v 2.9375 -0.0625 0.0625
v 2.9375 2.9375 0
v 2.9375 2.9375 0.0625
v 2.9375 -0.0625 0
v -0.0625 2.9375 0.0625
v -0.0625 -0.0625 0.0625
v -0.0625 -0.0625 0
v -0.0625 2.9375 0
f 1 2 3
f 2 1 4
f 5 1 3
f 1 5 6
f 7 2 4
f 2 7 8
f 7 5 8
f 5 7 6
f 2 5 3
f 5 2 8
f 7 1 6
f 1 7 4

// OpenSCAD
// element10.scad
// Units: inches

plate_w = 2 + 7/8;
plate_d = 2 + 7/8;
plate_h = 1/16;

hole_d = 3/32;
hole_r = hole_d / 2;

module rivet_holes() {
    // 10 holes per side; inset = half the spacing so holes form a clean frame
    spacing_x = plate_w / 10;
    spacing_y = plate_d / 10;
    inset_x   = spacing_x / 2;
    inset_y   = spacing_y / 2;
/*
    // Front edge
    for (i = [0:9])
        translate([inset_x + i * spacing_x, inset_y, -1])
            cylinder(h = plate_h + 2, r = hole_r, $fn = 20);

    // Back edge
    for (i = [0:9])
        translate([inset_x + i * spacing_x, plate_d - inset_y, -1])
            cylinder(h = plate_h + 2, r = hole_r, $fn = 20);
*/
    // Left edge
    for (i = [0:9])
        translate([inset_x, inset_y + i * spacing_y, -1])
            cylinder(h = plate_h + 2, r = hole_r, $fn = 20);

    // Right edge
    for (i = [0:9])
        translate([plate_w - inset_x, inset_y + i * spacing_y, -1])
            cylinder(h = plate_h + 2, r = hole_r, $fn = 20);
}

rivet_h = plate_h;

module rivets() {
    spacing_x = plate_w / 10;
    spacing_y = plate_d / 10;
    inset_x   = spacing_x / 2;
    inset_y   = spacing_y / 2;

    color("lightgray") {
/*
        // Front edge
        for (i = [0:9])
            translate([inset_x + i * spacing_x, inset_y, 0])
                cylinder(h = rivet_h, r = hole_r, $fn = 20);

        // Back edge
        for (i = [0:9])
            translate([inset_x + i * spacing_x, plate_d - inset_y, 0])
                cylinder(h = rivet_h, r = hole_r, $fn = 20);
*/
        // Left edge
        for (i = [0:9])
            translate([inset_x, inset_y + i * spacing_y, 0])
                cylinder(h = rivet_h, r = hole_r, $fn = 20);

        // Right edge
        for (i = [0:9])
            translate([plate_w - inset_x, inset_y + i * spacing_y, 0])
                cylinder(h = rivet_h, r = hole_r, $fn = 20);
    }
}

frame_w = 1/16;

// Roller slots
roller_count  = 11;
roller_h_size = 3/16;   // top-to-bottom thickness of each roller slot
roller_r      = roller_h_size / 2;

// Available space inside rivet frame (same inset as rivet spacing)
roller_inset_x = (plate_w / 10) / 2;
roller_inset_y = (plate_d / 10) / 2;
roller_zone_w  = plate_w - 2 * roller_inset_x;
roller_zone_d  = plate_d - 2 * roller_inset_y;

// Gap between rollers: split remaining vertical space evenly across 12 gaps
roller_gap = (roller_zone_d - roller_count * roller_h_size) / (roller_count + 1);

module roller_slots() {
    // Additional left/right clearzone equal to rivet-to-edge inset
    roller_x_start = 2 * roller_inset_x;
    roller_x_end   = plate_w - 2 * roller_inset_x;

    for (i = [0:roller_count - 1]) {
        cy = roller_inset_y + roller_gap + roller_r + i * (roller_h_size + roller_gap);
        translate([0, 0, -0.001])
        // Stadium shape: hull of two cylinders
        hull() {
            translate([roller_x_start + roller_r, cy, 0])
                cylinder(h = plate_h + 0.002, r = roller_r, $fn = 20);
            translate([roller_x_end - roller_r, cy, 0])
                cylinder(h = plate_h + 0.002, r = roller_r, $fn = 20);
        }
    }
}

belt_w = 1.75;
belt_d = 2 + 13/16;

module rollers() {
    roller_x_start = 2 * roller_inset_x;
    roller_x_end   = plate_w - 2 * roller_inset_x;

    color("green")
    difference() {
        for (i = [0:roller_count - 1]) {
            cy = roller_inset_y + roller_gap + roller_r + i * (roller_h_size + roller_gap);
            hull() {
                translate([roller_x_start + roller_r, cy, 0])
                    cylinder(h = plate_h, r = roller_r, $fn = 20);
                translate([roller_x_end - roller_r, cy, 0])
                    cylinder(h = plate_h, r = roller_r, $fn = 20);
            }
        }
        belt_cutout();
    }
}

module frame() {
    color("black")
    difference() {
        translate([-frame_w, -frame_w, 0])
            cube([plate_w + 2*frame_w, plate_d + 2*frame_w, plate_h]);
        translate([0, 0, -0.001])
            cube([plate_w, plate_d, plate_h + 0.002]);
    }
}

module belt_cutout() {
    translate([(plate_w - belt_w) / 2, -0.001, -0.001])
        cube([belt_w, plate_d + 0.002, plate_h + 0.002]);
}

module plate() {
    difference() {
        color("darkgray")
            cube([plate_w, plate_d, plate_h]);
        rivet_holes();
        roller_slots();
        belt_cutout();
    }
}

arrow_h       = 3/4 * plate_d;
arrow_w       = belt_w * 0.9;
arrow_outline = 1/8;
arrow_head_h  = arrow_h * 0.4;
arrow_shaft_h = arrow_h - arrow_head_h;
arrow_shaft_w = arrow_w * 0.4;

module arrow_2d() {
    polygon([
        [-arrow_shaft_w/2, 0],
        [ arrow_shaft_w/2, 0],
        [ arrow_shaft_w/2, arrow_shaft_h],
        [ arrow_w/2,       arrow_shaft_h],
        [ 0,               arrow_h],
        [-arrow_w/2,       arrow_shaft_h],
        [-arrow_shaft_w/2, arrow_shaft_h]
    ]);
}

module arrow_cutout() {
    translate([plate_w/2, (plate_d - arrow_h)/2, -0.001])
    linear_extrude(plate_h + 0.002)
    difference() {
        arrow_2d();
        offset(delta = -arrow_outline) arrow_2d();
    }
}

module arrow() {
    color("green")
    translate([plate_w/2, (plate_d - arrow_h)/2, 0])
    linear_extrude(plate_h)
    difference() {
        arrow_2d();
        offset(delta = -arrow_outline) arrow_2d();
    }
}

module belt() {
    color("black")
    difference() {
        translate([(plate_w - belt_w) / 2, 0, 0])
            cube([belt_w, plate_d, plate_h]);
        arrow_cutout();
    }
}

frame();
plate();
rivets();
rollers();
belt();
arrow();
